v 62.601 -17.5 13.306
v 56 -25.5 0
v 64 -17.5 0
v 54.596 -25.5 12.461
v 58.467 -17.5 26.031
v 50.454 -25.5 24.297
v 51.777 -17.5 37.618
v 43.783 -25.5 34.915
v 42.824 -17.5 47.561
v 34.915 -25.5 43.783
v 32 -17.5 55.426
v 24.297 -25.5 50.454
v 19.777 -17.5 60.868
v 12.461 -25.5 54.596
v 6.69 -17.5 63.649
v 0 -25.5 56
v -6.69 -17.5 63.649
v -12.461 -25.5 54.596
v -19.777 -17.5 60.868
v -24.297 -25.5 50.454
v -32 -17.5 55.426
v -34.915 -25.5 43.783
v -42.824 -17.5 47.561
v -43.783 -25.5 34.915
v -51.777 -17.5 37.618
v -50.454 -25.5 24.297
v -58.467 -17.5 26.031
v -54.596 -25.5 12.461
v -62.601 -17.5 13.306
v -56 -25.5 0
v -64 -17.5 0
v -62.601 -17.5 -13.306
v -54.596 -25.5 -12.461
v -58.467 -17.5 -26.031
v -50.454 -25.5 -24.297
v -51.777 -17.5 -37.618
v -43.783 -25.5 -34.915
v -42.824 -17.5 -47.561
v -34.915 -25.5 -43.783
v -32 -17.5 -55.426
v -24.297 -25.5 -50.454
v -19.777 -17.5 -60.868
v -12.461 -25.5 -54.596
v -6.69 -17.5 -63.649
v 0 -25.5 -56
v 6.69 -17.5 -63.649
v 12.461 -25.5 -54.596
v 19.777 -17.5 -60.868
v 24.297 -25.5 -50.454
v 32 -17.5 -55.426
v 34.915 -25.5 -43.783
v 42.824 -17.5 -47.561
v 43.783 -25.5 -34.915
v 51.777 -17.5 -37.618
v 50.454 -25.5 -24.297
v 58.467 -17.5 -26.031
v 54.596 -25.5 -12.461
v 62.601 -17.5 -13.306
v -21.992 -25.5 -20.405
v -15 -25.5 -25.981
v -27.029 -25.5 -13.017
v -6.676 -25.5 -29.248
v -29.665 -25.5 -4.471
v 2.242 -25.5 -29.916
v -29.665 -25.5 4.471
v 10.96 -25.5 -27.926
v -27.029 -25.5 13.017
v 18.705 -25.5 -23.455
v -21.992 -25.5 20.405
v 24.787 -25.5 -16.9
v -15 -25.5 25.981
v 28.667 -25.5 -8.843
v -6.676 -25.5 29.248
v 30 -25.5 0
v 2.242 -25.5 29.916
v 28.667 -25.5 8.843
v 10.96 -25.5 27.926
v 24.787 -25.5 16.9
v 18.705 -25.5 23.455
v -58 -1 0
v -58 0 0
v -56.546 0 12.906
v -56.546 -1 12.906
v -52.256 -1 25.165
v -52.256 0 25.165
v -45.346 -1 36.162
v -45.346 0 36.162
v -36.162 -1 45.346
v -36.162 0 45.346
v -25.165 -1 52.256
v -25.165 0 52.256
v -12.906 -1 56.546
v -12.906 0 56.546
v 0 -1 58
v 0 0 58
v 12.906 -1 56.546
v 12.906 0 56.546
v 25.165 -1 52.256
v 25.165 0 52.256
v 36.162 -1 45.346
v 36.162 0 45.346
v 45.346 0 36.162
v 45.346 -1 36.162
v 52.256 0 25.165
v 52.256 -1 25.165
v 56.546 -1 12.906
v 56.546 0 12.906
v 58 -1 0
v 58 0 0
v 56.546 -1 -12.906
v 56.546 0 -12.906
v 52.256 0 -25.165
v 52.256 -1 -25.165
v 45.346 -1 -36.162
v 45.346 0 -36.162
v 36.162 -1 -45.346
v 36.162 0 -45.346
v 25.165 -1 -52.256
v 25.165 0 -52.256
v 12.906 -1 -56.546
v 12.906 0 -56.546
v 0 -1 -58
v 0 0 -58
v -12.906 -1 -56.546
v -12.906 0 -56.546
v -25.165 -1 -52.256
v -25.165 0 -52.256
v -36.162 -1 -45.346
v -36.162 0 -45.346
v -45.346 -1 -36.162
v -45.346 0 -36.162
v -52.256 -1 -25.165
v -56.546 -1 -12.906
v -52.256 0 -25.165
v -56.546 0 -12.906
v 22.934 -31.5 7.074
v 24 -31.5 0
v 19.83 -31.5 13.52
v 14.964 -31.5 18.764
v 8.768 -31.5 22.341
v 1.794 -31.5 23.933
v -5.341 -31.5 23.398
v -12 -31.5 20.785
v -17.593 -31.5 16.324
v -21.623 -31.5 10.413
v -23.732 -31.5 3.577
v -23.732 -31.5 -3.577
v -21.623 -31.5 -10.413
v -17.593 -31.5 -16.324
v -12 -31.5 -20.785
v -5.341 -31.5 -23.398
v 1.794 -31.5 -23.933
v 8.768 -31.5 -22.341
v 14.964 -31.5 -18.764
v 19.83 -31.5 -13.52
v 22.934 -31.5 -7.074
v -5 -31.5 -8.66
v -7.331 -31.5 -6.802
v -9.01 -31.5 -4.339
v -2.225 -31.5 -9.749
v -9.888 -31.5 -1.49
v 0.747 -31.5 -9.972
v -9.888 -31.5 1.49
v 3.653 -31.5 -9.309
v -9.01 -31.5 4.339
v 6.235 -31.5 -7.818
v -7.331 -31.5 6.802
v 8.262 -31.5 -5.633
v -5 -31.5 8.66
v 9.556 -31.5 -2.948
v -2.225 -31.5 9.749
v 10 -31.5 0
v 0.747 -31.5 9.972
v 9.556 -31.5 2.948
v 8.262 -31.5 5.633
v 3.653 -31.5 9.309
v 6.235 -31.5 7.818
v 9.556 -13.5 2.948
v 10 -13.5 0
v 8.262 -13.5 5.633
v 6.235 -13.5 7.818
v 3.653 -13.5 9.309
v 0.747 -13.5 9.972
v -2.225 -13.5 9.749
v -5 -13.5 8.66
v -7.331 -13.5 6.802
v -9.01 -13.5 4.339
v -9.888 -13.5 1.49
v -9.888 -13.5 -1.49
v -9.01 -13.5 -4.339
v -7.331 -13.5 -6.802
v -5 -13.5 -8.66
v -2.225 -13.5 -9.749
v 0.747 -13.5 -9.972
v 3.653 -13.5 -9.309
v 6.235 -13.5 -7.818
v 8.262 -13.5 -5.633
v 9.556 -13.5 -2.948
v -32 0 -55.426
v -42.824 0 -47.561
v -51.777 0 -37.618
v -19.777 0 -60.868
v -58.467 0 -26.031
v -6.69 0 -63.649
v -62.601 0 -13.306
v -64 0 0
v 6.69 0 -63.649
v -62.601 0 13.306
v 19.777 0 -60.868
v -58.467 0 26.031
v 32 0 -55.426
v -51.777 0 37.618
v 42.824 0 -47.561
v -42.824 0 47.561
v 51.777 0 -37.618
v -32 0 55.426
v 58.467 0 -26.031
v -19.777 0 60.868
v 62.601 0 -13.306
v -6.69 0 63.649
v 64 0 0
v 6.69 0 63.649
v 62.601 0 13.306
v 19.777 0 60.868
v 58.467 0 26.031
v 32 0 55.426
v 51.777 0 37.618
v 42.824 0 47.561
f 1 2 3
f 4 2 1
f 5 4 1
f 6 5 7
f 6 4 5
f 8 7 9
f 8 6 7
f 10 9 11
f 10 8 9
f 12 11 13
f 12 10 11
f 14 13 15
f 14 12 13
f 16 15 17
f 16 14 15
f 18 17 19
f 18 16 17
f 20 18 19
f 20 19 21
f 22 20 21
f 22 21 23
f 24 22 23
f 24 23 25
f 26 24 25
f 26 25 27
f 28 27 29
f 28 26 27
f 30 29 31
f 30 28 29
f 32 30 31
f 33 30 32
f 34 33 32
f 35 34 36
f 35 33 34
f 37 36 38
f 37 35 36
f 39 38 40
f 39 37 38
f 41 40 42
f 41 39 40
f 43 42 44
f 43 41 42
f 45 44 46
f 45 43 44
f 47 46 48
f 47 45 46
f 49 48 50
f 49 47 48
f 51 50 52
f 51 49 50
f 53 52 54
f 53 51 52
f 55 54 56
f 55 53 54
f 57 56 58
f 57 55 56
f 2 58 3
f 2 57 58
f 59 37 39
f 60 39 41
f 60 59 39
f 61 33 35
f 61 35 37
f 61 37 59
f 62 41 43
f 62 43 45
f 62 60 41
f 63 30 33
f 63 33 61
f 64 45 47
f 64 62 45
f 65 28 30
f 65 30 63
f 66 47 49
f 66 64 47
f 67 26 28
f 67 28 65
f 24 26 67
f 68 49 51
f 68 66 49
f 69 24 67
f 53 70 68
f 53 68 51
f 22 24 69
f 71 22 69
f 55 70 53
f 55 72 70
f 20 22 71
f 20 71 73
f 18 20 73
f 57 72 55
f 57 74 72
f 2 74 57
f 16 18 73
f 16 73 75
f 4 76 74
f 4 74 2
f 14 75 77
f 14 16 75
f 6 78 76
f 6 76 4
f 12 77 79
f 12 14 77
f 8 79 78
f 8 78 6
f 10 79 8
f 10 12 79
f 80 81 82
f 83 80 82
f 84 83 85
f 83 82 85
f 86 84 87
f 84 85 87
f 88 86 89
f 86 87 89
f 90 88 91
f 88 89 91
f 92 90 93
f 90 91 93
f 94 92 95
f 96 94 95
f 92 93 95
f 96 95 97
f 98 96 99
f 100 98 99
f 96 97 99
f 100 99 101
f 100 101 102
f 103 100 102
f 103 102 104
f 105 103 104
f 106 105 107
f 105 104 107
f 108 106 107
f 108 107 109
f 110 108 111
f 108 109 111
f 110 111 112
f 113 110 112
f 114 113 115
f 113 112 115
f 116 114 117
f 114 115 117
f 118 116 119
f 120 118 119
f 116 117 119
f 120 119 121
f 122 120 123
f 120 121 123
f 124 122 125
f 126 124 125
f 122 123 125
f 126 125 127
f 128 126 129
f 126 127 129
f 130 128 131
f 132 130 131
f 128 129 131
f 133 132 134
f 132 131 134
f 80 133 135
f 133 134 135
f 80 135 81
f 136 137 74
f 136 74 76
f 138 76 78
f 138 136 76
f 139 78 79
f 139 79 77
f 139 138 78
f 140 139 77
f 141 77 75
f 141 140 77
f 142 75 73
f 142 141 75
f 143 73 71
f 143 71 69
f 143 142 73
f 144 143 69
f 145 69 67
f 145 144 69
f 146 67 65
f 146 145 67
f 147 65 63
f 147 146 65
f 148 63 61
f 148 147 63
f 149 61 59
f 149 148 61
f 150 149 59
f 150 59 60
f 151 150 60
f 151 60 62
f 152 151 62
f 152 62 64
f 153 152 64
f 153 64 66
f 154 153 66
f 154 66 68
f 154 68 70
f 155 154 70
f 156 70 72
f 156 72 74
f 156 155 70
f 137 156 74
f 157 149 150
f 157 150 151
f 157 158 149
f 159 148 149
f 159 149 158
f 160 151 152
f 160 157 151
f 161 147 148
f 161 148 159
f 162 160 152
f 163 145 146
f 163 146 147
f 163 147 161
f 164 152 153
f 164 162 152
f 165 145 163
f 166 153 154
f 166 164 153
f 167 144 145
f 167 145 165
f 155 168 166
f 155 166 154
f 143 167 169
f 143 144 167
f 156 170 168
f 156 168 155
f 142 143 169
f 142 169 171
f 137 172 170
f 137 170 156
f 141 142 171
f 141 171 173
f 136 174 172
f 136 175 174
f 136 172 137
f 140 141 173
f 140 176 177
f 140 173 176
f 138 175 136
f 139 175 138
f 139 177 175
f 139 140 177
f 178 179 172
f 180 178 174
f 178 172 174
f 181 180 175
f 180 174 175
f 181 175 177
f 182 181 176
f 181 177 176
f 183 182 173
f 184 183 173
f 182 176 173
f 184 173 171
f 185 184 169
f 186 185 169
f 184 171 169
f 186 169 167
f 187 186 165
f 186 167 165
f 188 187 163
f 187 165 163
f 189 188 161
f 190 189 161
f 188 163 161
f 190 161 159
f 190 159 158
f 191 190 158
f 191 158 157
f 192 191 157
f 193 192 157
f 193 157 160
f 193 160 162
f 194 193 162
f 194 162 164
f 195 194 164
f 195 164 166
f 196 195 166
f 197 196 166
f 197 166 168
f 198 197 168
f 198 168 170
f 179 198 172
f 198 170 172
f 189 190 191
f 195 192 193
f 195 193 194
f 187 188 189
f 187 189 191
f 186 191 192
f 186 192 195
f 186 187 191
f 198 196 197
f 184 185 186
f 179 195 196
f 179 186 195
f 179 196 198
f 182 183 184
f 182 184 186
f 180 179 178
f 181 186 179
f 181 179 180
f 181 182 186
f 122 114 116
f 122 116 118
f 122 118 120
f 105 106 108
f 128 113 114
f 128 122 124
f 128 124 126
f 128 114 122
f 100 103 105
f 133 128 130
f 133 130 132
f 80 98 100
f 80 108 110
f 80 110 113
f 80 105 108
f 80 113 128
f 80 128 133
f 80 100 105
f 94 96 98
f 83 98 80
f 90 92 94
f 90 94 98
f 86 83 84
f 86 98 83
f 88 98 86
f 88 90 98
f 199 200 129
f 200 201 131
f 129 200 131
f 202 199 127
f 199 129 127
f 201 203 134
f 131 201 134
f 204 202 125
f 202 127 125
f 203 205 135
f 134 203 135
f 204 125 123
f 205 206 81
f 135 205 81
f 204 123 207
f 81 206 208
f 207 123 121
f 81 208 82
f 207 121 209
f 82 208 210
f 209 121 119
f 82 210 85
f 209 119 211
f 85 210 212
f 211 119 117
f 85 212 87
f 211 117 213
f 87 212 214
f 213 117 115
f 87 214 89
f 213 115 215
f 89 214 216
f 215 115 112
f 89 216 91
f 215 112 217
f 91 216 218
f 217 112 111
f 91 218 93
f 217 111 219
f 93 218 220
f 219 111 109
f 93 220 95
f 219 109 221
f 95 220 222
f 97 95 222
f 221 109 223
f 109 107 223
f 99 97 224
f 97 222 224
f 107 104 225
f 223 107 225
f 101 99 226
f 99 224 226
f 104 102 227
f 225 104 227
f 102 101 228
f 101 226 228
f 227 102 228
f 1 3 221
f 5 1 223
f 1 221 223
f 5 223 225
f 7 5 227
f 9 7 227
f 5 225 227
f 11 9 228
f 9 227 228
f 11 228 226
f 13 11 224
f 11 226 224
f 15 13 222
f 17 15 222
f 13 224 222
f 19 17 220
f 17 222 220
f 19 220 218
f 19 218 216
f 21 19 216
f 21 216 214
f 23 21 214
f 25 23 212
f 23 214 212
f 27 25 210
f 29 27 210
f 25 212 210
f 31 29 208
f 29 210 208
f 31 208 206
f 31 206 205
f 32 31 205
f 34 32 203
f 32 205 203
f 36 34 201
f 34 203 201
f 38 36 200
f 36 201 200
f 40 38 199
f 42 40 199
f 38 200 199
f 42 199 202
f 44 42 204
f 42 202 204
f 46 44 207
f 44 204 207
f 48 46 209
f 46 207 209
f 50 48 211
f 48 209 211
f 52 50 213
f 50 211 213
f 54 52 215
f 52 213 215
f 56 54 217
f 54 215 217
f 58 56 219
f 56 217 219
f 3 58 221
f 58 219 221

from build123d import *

# Parameters (mm, degrees)
F0_R      = 64
F1_DEPTH  = 25.5
F2_R      = 58
F3_DEPTH  = 1
F4_SIZE   = 8
F5_R      = 30
F6_DEPTH  = 6
F7_SIZE   = 5.99999
F9_R      = 10
F10_DEPTH = 18


# Not quite as in the source:
# - a fillet or chamfer is up to 0.001 mm smaller than in the source, because OpenCascade refuses the exact size


with BuildPart() as f1:
    # F0 (on Front) → F1 (new body)
    with BuildSketch(Plane.XZ):
        Circle(F0_R)
    extrude(amount=F1_DEPTH)

    # F2 (on face) → F3 (cut)
    with BuildSketch(Plane(origin=(0, 0, 0), x_dir=(-1, 0, 0), z_dir=(0, 1, 0))):
        Circle(F2_R)
    extrude(amount=-F3_DEPTH, mode=Mode.SUBTRACT)

    # F4
    f4_edges = [f1.edges().sort_by_distance(p)[0] for p in [
        (-64, -25.5, 0),
    ]]
    chamfer(f4_edges, length=F4_SIZE)

    # F5 (on face) → F6 (join)
    with BuildSketch(Plane.XZ.offset(25.5)):
        Circle(F5_R)
    extrude(amount=F6_DEPTH)

    # F7 (size 6 in the source; OpenCascade refuses exactly that, so slightly less here)
    f7_edges = [f1.edges().sort_by_distance(p)[0] for p in [
        (-30, -31.5, 0),
    ]]
    chamfer(f7_edges, length=F7_SIZE)

    # F9 (on face) → F10 (cut)
    with BuildSketch(Plane.XZ.offset(31.5)):
        Circle(F9_R)
    extrude(amount=-F10_DEPTH, mode=Mode.SUBTRACT)


solid = f1.part
